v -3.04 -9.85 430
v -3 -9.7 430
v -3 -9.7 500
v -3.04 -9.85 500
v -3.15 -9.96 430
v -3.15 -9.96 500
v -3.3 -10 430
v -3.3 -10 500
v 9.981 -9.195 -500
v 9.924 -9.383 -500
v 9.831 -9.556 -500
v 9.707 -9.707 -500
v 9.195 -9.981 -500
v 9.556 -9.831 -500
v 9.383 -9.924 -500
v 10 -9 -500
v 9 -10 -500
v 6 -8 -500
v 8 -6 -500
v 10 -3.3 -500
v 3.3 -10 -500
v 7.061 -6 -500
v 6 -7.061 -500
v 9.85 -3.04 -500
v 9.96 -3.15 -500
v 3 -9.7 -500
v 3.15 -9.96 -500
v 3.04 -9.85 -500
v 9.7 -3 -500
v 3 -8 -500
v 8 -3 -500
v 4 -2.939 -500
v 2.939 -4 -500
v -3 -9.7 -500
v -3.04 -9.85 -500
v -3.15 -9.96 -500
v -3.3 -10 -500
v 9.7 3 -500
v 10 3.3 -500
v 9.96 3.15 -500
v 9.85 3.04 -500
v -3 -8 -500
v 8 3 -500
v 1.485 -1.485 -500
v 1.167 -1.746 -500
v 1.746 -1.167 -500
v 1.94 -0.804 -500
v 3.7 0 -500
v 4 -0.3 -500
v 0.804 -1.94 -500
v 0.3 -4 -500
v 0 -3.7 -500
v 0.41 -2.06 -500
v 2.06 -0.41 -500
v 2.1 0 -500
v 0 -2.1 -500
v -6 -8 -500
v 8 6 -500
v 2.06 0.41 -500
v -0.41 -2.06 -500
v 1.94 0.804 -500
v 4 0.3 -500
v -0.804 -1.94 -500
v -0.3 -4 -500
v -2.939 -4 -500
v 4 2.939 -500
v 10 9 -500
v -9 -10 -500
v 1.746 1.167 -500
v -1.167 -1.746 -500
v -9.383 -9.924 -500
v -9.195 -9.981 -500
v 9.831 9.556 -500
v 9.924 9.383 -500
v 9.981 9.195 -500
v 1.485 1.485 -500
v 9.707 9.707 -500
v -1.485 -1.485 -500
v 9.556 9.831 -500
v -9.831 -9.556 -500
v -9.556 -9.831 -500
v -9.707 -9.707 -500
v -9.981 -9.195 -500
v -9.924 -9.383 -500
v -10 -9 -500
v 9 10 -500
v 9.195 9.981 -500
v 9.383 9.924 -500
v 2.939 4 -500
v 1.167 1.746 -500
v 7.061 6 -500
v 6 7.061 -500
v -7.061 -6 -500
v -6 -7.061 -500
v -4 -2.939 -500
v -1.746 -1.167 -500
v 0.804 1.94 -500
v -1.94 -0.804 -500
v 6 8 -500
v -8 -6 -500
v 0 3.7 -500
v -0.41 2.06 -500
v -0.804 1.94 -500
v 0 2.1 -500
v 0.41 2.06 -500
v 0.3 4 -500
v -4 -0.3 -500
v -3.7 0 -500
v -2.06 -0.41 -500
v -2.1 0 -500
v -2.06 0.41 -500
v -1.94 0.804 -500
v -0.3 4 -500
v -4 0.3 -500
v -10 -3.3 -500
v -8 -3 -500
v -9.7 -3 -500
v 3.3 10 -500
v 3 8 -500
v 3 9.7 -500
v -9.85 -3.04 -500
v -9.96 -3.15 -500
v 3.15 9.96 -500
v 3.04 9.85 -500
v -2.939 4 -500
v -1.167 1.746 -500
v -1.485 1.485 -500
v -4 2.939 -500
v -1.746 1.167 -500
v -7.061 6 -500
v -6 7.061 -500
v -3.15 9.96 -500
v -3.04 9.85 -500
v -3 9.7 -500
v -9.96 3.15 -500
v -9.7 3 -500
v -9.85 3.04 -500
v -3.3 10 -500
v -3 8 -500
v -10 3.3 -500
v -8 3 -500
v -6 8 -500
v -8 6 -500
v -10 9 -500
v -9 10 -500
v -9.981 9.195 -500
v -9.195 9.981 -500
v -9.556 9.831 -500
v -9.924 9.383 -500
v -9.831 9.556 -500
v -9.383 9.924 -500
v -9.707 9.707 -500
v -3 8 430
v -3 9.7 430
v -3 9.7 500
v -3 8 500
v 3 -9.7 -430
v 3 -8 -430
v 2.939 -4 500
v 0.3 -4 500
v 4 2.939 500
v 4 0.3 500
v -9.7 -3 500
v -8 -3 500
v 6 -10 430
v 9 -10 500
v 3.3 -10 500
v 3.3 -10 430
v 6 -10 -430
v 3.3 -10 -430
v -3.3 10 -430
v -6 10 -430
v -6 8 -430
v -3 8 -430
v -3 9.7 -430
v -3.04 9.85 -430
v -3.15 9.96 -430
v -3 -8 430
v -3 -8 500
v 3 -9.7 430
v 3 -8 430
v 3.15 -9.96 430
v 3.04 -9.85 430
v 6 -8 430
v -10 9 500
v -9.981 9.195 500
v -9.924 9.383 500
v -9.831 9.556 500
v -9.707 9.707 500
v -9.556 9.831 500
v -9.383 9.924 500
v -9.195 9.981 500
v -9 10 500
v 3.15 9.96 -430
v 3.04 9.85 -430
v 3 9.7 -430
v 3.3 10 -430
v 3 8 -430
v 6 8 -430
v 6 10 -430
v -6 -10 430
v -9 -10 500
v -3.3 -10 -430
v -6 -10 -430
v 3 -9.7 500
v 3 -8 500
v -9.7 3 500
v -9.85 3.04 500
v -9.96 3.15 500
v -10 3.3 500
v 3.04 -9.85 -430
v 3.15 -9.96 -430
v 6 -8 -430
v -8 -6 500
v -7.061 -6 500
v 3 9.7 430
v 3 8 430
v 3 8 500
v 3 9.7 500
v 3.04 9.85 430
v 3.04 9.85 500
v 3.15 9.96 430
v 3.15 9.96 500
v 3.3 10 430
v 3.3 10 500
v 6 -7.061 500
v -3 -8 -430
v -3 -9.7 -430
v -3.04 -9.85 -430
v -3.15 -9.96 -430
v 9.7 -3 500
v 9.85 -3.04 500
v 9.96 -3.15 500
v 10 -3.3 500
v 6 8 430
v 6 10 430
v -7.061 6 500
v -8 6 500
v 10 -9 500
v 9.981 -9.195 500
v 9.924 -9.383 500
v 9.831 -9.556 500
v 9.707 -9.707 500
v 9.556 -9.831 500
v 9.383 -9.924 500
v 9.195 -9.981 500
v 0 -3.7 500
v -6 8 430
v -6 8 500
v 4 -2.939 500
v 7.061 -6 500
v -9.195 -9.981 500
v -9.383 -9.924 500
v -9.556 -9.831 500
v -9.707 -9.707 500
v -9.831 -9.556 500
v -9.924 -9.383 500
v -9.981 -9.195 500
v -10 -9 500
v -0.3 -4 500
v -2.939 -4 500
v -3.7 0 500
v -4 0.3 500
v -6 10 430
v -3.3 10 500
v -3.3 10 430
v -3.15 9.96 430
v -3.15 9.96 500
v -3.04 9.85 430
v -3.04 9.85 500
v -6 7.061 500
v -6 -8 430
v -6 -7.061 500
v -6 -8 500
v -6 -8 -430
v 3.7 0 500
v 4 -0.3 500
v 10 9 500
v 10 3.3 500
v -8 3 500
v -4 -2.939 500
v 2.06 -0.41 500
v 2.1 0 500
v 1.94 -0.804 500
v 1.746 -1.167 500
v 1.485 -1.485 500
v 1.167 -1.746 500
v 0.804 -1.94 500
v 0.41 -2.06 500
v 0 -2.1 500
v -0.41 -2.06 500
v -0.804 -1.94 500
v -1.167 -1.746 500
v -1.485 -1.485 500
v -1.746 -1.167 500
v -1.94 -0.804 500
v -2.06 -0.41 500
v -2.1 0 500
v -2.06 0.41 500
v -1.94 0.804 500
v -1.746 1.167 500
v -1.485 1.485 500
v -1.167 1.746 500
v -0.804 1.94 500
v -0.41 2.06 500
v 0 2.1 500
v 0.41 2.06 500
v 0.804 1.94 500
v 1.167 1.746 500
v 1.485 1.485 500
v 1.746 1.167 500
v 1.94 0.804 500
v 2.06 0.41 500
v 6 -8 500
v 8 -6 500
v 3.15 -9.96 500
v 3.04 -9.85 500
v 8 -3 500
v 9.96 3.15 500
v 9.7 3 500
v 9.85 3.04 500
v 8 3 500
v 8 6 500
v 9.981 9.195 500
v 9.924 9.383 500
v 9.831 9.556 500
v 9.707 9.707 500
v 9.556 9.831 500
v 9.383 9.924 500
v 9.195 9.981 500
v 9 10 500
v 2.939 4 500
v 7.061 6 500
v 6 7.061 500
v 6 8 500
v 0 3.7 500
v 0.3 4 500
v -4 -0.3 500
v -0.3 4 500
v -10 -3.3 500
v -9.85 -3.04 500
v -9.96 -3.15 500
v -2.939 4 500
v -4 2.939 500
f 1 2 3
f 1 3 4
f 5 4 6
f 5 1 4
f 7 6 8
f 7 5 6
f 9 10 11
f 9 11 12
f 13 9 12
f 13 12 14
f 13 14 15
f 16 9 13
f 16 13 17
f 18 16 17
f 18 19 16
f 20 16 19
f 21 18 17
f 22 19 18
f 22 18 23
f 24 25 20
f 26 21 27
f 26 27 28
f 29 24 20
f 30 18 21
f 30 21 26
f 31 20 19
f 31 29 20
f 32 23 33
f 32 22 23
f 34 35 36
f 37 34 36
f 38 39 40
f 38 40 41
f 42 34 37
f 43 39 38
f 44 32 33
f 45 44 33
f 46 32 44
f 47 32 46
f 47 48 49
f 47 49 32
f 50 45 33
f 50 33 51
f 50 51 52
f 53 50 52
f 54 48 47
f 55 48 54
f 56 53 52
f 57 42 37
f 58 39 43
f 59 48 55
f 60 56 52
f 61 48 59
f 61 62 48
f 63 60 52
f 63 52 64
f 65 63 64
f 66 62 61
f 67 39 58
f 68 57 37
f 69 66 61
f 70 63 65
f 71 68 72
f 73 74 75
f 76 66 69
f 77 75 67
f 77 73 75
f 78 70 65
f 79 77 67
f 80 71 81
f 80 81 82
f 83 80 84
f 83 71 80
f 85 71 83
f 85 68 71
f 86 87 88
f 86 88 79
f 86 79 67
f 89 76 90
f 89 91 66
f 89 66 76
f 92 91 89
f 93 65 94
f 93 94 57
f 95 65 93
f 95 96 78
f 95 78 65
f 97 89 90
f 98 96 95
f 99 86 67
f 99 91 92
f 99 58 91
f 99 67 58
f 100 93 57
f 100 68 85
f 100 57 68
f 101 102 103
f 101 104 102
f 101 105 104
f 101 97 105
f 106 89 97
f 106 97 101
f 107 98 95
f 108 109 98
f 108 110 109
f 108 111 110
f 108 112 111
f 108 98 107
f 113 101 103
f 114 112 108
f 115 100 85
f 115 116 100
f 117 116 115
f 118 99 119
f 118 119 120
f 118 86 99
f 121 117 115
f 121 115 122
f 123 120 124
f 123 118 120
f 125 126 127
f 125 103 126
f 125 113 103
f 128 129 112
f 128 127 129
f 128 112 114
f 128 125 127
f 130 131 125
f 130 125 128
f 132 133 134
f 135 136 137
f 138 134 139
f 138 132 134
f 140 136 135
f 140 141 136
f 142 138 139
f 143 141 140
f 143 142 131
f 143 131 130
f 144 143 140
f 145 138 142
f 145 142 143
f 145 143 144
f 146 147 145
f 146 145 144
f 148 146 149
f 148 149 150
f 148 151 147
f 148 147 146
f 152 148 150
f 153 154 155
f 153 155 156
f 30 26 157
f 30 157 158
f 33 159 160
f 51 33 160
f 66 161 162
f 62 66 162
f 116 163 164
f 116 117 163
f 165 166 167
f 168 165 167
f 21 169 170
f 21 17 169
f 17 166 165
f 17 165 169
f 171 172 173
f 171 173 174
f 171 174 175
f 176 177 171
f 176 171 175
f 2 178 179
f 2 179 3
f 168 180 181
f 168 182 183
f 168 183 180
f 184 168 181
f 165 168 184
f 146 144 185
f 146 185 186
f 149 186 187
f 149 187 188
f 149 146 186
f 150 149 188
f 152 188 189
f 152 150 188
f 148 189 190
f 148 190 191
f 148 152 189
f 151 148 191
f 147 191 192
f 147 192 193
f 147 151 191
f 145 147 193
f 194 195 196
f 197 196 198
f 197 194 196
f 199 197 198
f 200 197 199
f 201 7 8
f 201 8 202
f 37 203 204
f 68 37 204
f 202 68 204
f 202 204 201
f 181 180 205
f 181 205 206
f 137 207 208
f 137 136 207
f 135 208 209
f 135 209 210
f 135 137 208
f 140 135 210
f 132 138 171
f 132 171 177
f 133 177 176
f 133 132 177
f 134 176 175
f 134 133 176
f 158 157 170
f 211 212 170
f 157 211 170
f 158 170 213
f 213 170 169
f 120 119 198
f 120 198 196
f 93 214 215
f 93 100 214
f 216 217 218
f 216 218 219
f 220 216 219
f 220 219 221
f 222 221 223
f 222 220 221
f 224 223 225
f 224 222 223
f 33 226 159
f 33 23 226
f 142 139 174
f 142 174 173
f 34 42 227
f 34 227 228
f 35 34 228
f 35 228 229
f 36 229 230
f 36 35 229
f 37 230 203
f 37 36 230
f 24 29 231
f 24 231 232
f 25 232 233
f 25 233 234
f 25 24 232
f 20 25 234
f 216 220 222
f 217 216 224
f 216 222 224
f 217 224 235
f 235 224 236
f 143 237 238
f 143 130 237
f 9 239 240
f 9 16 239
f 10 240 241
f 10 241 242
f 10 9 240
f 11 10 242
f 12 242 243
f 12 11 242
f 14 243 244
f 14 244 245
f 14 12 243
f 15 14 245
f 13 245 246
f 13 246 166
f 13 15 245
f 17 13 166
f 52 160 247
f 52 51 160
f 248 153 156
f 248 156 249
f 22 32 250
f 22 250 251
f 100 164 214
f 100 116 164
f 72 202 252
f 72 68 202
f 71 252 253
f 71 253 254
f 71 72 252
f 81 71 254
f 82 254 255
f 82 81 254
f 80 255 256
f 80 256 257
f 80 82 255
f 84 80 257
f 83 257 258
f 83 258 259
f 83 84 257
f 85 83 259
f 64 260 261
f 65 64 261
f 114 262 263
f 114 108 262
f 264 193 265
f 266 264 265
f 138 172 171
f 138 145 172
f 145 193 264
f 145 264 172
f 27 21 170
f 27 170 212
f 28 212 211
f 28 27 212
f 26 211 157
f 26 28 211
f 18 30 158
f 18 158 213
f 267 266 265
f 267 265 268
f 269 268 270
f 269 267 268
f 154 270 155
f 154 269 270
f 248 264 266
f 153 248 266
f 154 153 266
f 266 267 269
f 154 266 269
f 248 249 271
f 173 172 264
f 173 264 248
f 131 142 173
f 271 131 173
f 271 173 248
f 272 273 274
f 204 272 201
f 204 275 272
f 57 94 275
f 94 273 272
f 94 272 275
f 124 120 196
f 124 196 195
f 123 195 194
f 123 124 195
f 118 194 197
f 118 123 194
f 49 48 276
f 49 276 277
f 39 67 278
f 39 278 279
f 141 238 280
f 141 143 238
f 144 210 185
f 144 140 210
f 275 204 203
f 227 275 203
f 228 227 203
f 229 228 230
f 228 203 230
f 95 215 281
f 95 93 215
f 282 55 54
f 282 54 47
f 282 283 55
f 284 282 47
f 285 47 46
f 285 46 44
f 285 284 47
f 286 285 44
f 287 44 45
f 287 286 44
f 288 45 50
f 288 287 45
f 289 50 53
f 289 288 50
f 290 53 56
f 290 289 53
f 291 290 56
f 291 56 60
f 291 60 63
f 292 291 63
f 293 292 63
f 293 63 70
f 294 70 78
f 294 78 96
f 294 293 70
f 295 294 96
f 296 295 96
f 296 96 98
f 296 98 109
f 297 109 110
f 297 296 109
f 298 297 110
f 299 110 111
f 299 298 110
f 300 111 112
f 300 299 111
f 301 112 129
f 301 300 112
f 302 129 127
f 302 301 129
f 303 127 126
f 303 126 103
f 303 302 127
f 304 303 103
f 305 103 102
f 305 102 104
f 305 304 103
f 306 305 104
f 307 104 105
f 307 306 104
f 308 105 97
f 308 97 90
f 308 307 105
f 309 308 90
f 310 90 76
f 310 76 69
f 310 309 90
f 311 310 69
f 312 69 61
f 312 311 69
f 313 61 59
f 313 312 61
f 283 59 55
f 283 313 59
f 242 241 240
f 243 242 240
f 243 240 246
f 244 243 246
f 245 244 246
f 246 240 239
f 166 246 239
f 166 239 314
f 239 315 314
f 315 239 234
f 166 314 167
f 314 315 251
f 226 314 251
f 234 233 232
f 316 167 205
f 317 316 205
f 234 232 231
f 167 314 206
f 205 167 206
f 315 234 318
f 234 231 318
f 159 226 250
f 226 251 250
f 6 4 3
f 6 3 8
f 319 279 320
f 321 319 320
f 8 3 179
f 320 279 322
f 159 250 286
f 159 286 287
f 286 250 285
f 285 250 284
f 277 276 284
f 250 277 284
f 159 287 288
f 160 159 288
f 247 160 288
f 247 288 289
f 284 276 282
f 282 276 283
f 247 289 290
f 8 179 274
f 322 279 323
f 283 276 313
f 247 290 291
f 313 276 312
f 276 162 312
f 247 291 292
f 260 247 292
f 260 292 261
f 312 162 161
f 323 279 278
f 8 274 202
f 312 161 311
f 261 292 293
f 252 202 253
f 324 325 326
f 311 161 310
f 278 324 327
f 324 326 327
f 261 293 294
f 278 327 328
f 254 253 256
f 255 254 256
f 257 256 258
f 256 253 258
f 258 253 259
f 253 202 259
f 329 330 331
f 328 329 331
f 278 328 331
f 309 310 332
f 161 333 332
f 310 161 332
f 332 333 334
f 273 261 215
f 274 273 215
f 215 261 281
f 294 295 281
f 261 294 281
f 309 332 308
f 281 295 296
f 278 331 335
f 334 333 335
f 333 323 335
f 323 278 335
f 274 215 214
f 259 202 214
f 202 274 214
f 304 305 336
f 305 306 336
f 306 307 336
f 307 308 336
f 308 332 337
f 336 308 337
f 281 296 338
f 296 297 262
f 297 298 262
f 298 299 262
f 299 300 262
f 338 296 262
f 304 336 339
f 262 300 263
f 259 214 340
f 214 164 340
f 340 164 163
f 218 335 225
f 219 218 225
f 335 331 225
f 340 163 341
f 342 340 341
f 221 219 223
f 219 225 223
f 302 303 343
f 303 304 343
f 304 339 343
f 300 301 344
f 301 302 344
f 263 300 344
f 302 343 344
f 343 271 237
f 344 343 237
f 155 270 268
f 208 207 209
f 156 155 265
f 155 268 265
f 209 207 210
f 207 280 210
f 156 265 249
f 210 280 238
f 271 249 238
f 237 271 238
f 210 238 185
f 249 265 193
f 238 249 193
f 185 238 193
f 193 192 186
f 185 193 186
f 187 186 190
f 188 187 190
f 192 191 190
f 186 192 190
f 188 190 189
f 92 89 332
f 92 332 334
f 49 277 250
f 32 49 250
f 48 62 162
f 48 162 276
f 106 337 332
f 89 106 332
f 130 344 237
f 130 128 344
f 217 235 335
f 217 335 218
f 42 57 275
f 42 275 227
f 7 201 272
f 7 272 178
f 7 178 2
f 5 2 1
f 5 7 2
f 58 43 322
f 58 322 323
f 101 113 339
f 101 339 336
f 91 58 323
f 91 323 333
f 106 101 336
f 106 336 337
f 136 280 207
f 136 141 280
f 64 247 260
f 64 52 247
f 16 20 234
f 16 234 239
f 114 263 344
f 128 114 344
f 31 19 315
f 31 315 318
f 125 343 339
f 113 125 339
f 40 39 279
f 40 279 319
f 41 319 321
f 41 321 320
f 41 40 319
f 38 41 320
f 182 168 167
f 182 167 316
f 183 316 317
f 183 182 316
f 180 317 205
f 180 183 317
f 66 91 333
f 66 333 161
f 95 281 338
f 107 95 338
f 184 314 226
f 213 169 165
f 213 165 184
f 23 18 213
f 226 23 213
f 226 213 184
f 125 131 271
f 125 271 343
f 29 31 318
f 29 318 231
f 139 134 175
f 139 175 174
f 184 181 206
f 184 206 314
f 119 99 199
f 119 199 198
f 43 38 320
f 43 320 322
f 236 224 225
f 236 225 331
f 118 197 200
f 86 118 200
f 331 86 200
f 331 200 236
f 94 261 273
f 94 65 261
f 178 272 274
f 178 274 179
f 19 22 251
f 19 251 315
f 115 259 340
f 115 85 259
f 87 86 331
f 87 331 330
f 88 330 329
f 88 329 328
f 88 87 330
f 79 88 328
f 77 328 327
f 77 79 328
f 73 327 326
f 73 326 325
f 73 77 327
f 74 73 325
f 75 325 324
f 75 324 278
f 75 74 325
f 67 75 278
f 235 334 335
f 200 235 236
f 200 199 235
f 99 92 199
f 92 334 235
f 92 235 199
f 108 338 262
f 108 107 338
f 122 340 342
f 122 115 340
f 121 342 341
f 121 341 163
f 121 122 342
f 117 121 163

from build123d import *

# Parameters (mm, degrees)
SKETCH1_R           = 2.1
BOSS_EXTRUDE1_DEPTH = 500
SKETCH2_W           = 12
SKETCH2_H           = 2
CUT_EXTRUDE1_DEPTH  = 430


with BuildPart() as part:
    # Sketch1 → Boss-Extrude1 (new, symmetric)
    with BuildSketch(Plane(origin=(0, 0, 0), x_dir=(-1, 0, 0), z_dir=(0, 0, -1))):
        with BuildLine():
            Line((10, 3.3), (10, 9))
            ThreePointArc((10, 9), (9.707106781, 9.707106781), (9, 10))
            Line((9, 10), (3.3, 10))
            ThreePointArc((3.3, 10), (3.087867966, 9.912132034), (3, 9.7))
            Line((3, 9.7), (3, 8))
            Line((3, 8), (6, 8))
            Line((6, 8), (6, 7.060660172))
            Line((6, 7.060660172), (2.939339828, 4))
            Line((2.939339828, 4), (0.3, 4))
            Line((0.3, 4), (0, 3.7))
            Line((0, 3.7), (-0.3, 4))
            Line((-0.3, 4), (-2.939339828, 4))
            Line((-2.939339828, 4), (-6, 7.060660172))
            Line((-6, 7.060660172), (-6, 8))
            Line((-6, 8), (-3, 8))
            Line((-3, 8), (-3, 9.7))
            ThreePointArc((-3, 9.7), (-3.087867966, 9.912132034), (-3.3, 10))
            Line((-3.3, 10), (-9, 10))
            ThreePointArc((-9, 10), (-9.707106781, 9.707106781), (-10, 9))
            Line((-10, 9), (-10, 3.3))
            ThreePointArc((-10, 3.3), (-9.912132034, 3.087867966), (-9.7, 3))
            Line((-9.7, 3), (-8, 3))
            Line((-8, 3), (-8, 6))
            Line((-8, 6), (-7.060660172, 6))
            Line((-7.060660172, 6), (-4, 2.939339828))
            Line((-4, 2.939339828), (-4, 0.3))
            Line((-4, 0.3), (-3.7, 0))
            Line((-3.7, 0), (-4, -0.3))
            Line((-4, -0.3), (-4, -2.939339828))
            Line((-4, -2.939339828), (-7.060660172, -6))
            Line((-7.060660172, -6), (-8, -6))
            Line((-8, -6), (-8, -3))
            Line((-8, -3), (-9.7, -3))
            ThreePointArc((-9.7, -3), (-9.912132034, -3.087867966), (-10, -3.3))
            Line((-10, -3.3), (-10, -9))
            ThreePointArc((-10, -9), (-9.707106781, -9.707106781), (-9, -10))
            Line((-9, -10), (-3.3, -10))
            ThreePointArc((-3.3, -10), (-3.087867966, -9.912132034), (-3, -9.7))
            Line((-3, -9.7), (-3, -8))
            Line((-3, -8), (-6, -8))
            Line((-6, -8), (-6, -7.060660172))
            Line((-6, -7.060660172), (-2.939339828, -4))
            Line((-2.939339828, -4), (-0.3, -4))
            Line((-0.3, -4), (0, -3.7))
            Line((0, -3.7), (0.3, -4))
            Line((0.3, -4), (2.939339828, -4))
            Line((2.939339828, -4), (6, -7.060660172))
            Line((6, -7.060660172), (6, -8))
            Line((6, -8), (3, -8))
            Line((3, -8), (3, -9.7))
            ThreePointArc((3, -9.7), (3.087867966, -9.912132034), (3.3, -10))
            Line((3.3, -10), (9, -10))
            ThreePointArc((9, -10), (9.707106781, -9.707106781), (10, -9))
            Line((10, -9), (10, -3.3))
            ThreePointArc((10, -3.3), (9.912132034, -3.087867966), (9.7, -3))
            Line((9.7, -3), (8, -3))
            Line((8, -3), (8, -6))
            Line((8, -6), (7.060660172, -6))
            Line((7.060660172, -6), (4, -2.939339828))
            Line((4, -2.939339828), (4, -0.3))
            Line((4, -0.3), (3.7, 0))
            Line((3.7, 0), (4, 0.3))
            Line((4, 0.3), (4, 2.939339828))
            Line((4, 2.939339828), (7.060660172, 6))
            Line((7.060660172, 6), (8, 6))
            Line((8, 6), (8, 3))
            Line((8, 3), (9.7, 3))
            ThreePointArc((9.7, 3), (9.912132034, 3.087867966), (10, 3.3))
        make_face()
        with Locations(Location((0, 0, 0), (0, 0, 180))):
            Circle(SKETCH1_R, mode=Mode.SUBTRACT)
    extrude(amount=BOSS_EXTRUDE1_DEPTH, both=True)

    # Sketch2 → Cut-Extrude1 (cut, symmetric)
    with BuildSketch(Plane.XY):
        with Locations((0, 9)):
            Rectangle(SKETCH2_W, SKETCH2_H)
    cut_extrude1 = extrude(amount=CUT_EXTRUDE1_DEPTH, both=True, mode=Mode.SUBTRACT)

    # Mirror1: Cut-Extrude1 across plane
    add(cut_extrude1.mirror(Plane.ZX), mode=Mode.SUBTRACT)


solid = part.part
